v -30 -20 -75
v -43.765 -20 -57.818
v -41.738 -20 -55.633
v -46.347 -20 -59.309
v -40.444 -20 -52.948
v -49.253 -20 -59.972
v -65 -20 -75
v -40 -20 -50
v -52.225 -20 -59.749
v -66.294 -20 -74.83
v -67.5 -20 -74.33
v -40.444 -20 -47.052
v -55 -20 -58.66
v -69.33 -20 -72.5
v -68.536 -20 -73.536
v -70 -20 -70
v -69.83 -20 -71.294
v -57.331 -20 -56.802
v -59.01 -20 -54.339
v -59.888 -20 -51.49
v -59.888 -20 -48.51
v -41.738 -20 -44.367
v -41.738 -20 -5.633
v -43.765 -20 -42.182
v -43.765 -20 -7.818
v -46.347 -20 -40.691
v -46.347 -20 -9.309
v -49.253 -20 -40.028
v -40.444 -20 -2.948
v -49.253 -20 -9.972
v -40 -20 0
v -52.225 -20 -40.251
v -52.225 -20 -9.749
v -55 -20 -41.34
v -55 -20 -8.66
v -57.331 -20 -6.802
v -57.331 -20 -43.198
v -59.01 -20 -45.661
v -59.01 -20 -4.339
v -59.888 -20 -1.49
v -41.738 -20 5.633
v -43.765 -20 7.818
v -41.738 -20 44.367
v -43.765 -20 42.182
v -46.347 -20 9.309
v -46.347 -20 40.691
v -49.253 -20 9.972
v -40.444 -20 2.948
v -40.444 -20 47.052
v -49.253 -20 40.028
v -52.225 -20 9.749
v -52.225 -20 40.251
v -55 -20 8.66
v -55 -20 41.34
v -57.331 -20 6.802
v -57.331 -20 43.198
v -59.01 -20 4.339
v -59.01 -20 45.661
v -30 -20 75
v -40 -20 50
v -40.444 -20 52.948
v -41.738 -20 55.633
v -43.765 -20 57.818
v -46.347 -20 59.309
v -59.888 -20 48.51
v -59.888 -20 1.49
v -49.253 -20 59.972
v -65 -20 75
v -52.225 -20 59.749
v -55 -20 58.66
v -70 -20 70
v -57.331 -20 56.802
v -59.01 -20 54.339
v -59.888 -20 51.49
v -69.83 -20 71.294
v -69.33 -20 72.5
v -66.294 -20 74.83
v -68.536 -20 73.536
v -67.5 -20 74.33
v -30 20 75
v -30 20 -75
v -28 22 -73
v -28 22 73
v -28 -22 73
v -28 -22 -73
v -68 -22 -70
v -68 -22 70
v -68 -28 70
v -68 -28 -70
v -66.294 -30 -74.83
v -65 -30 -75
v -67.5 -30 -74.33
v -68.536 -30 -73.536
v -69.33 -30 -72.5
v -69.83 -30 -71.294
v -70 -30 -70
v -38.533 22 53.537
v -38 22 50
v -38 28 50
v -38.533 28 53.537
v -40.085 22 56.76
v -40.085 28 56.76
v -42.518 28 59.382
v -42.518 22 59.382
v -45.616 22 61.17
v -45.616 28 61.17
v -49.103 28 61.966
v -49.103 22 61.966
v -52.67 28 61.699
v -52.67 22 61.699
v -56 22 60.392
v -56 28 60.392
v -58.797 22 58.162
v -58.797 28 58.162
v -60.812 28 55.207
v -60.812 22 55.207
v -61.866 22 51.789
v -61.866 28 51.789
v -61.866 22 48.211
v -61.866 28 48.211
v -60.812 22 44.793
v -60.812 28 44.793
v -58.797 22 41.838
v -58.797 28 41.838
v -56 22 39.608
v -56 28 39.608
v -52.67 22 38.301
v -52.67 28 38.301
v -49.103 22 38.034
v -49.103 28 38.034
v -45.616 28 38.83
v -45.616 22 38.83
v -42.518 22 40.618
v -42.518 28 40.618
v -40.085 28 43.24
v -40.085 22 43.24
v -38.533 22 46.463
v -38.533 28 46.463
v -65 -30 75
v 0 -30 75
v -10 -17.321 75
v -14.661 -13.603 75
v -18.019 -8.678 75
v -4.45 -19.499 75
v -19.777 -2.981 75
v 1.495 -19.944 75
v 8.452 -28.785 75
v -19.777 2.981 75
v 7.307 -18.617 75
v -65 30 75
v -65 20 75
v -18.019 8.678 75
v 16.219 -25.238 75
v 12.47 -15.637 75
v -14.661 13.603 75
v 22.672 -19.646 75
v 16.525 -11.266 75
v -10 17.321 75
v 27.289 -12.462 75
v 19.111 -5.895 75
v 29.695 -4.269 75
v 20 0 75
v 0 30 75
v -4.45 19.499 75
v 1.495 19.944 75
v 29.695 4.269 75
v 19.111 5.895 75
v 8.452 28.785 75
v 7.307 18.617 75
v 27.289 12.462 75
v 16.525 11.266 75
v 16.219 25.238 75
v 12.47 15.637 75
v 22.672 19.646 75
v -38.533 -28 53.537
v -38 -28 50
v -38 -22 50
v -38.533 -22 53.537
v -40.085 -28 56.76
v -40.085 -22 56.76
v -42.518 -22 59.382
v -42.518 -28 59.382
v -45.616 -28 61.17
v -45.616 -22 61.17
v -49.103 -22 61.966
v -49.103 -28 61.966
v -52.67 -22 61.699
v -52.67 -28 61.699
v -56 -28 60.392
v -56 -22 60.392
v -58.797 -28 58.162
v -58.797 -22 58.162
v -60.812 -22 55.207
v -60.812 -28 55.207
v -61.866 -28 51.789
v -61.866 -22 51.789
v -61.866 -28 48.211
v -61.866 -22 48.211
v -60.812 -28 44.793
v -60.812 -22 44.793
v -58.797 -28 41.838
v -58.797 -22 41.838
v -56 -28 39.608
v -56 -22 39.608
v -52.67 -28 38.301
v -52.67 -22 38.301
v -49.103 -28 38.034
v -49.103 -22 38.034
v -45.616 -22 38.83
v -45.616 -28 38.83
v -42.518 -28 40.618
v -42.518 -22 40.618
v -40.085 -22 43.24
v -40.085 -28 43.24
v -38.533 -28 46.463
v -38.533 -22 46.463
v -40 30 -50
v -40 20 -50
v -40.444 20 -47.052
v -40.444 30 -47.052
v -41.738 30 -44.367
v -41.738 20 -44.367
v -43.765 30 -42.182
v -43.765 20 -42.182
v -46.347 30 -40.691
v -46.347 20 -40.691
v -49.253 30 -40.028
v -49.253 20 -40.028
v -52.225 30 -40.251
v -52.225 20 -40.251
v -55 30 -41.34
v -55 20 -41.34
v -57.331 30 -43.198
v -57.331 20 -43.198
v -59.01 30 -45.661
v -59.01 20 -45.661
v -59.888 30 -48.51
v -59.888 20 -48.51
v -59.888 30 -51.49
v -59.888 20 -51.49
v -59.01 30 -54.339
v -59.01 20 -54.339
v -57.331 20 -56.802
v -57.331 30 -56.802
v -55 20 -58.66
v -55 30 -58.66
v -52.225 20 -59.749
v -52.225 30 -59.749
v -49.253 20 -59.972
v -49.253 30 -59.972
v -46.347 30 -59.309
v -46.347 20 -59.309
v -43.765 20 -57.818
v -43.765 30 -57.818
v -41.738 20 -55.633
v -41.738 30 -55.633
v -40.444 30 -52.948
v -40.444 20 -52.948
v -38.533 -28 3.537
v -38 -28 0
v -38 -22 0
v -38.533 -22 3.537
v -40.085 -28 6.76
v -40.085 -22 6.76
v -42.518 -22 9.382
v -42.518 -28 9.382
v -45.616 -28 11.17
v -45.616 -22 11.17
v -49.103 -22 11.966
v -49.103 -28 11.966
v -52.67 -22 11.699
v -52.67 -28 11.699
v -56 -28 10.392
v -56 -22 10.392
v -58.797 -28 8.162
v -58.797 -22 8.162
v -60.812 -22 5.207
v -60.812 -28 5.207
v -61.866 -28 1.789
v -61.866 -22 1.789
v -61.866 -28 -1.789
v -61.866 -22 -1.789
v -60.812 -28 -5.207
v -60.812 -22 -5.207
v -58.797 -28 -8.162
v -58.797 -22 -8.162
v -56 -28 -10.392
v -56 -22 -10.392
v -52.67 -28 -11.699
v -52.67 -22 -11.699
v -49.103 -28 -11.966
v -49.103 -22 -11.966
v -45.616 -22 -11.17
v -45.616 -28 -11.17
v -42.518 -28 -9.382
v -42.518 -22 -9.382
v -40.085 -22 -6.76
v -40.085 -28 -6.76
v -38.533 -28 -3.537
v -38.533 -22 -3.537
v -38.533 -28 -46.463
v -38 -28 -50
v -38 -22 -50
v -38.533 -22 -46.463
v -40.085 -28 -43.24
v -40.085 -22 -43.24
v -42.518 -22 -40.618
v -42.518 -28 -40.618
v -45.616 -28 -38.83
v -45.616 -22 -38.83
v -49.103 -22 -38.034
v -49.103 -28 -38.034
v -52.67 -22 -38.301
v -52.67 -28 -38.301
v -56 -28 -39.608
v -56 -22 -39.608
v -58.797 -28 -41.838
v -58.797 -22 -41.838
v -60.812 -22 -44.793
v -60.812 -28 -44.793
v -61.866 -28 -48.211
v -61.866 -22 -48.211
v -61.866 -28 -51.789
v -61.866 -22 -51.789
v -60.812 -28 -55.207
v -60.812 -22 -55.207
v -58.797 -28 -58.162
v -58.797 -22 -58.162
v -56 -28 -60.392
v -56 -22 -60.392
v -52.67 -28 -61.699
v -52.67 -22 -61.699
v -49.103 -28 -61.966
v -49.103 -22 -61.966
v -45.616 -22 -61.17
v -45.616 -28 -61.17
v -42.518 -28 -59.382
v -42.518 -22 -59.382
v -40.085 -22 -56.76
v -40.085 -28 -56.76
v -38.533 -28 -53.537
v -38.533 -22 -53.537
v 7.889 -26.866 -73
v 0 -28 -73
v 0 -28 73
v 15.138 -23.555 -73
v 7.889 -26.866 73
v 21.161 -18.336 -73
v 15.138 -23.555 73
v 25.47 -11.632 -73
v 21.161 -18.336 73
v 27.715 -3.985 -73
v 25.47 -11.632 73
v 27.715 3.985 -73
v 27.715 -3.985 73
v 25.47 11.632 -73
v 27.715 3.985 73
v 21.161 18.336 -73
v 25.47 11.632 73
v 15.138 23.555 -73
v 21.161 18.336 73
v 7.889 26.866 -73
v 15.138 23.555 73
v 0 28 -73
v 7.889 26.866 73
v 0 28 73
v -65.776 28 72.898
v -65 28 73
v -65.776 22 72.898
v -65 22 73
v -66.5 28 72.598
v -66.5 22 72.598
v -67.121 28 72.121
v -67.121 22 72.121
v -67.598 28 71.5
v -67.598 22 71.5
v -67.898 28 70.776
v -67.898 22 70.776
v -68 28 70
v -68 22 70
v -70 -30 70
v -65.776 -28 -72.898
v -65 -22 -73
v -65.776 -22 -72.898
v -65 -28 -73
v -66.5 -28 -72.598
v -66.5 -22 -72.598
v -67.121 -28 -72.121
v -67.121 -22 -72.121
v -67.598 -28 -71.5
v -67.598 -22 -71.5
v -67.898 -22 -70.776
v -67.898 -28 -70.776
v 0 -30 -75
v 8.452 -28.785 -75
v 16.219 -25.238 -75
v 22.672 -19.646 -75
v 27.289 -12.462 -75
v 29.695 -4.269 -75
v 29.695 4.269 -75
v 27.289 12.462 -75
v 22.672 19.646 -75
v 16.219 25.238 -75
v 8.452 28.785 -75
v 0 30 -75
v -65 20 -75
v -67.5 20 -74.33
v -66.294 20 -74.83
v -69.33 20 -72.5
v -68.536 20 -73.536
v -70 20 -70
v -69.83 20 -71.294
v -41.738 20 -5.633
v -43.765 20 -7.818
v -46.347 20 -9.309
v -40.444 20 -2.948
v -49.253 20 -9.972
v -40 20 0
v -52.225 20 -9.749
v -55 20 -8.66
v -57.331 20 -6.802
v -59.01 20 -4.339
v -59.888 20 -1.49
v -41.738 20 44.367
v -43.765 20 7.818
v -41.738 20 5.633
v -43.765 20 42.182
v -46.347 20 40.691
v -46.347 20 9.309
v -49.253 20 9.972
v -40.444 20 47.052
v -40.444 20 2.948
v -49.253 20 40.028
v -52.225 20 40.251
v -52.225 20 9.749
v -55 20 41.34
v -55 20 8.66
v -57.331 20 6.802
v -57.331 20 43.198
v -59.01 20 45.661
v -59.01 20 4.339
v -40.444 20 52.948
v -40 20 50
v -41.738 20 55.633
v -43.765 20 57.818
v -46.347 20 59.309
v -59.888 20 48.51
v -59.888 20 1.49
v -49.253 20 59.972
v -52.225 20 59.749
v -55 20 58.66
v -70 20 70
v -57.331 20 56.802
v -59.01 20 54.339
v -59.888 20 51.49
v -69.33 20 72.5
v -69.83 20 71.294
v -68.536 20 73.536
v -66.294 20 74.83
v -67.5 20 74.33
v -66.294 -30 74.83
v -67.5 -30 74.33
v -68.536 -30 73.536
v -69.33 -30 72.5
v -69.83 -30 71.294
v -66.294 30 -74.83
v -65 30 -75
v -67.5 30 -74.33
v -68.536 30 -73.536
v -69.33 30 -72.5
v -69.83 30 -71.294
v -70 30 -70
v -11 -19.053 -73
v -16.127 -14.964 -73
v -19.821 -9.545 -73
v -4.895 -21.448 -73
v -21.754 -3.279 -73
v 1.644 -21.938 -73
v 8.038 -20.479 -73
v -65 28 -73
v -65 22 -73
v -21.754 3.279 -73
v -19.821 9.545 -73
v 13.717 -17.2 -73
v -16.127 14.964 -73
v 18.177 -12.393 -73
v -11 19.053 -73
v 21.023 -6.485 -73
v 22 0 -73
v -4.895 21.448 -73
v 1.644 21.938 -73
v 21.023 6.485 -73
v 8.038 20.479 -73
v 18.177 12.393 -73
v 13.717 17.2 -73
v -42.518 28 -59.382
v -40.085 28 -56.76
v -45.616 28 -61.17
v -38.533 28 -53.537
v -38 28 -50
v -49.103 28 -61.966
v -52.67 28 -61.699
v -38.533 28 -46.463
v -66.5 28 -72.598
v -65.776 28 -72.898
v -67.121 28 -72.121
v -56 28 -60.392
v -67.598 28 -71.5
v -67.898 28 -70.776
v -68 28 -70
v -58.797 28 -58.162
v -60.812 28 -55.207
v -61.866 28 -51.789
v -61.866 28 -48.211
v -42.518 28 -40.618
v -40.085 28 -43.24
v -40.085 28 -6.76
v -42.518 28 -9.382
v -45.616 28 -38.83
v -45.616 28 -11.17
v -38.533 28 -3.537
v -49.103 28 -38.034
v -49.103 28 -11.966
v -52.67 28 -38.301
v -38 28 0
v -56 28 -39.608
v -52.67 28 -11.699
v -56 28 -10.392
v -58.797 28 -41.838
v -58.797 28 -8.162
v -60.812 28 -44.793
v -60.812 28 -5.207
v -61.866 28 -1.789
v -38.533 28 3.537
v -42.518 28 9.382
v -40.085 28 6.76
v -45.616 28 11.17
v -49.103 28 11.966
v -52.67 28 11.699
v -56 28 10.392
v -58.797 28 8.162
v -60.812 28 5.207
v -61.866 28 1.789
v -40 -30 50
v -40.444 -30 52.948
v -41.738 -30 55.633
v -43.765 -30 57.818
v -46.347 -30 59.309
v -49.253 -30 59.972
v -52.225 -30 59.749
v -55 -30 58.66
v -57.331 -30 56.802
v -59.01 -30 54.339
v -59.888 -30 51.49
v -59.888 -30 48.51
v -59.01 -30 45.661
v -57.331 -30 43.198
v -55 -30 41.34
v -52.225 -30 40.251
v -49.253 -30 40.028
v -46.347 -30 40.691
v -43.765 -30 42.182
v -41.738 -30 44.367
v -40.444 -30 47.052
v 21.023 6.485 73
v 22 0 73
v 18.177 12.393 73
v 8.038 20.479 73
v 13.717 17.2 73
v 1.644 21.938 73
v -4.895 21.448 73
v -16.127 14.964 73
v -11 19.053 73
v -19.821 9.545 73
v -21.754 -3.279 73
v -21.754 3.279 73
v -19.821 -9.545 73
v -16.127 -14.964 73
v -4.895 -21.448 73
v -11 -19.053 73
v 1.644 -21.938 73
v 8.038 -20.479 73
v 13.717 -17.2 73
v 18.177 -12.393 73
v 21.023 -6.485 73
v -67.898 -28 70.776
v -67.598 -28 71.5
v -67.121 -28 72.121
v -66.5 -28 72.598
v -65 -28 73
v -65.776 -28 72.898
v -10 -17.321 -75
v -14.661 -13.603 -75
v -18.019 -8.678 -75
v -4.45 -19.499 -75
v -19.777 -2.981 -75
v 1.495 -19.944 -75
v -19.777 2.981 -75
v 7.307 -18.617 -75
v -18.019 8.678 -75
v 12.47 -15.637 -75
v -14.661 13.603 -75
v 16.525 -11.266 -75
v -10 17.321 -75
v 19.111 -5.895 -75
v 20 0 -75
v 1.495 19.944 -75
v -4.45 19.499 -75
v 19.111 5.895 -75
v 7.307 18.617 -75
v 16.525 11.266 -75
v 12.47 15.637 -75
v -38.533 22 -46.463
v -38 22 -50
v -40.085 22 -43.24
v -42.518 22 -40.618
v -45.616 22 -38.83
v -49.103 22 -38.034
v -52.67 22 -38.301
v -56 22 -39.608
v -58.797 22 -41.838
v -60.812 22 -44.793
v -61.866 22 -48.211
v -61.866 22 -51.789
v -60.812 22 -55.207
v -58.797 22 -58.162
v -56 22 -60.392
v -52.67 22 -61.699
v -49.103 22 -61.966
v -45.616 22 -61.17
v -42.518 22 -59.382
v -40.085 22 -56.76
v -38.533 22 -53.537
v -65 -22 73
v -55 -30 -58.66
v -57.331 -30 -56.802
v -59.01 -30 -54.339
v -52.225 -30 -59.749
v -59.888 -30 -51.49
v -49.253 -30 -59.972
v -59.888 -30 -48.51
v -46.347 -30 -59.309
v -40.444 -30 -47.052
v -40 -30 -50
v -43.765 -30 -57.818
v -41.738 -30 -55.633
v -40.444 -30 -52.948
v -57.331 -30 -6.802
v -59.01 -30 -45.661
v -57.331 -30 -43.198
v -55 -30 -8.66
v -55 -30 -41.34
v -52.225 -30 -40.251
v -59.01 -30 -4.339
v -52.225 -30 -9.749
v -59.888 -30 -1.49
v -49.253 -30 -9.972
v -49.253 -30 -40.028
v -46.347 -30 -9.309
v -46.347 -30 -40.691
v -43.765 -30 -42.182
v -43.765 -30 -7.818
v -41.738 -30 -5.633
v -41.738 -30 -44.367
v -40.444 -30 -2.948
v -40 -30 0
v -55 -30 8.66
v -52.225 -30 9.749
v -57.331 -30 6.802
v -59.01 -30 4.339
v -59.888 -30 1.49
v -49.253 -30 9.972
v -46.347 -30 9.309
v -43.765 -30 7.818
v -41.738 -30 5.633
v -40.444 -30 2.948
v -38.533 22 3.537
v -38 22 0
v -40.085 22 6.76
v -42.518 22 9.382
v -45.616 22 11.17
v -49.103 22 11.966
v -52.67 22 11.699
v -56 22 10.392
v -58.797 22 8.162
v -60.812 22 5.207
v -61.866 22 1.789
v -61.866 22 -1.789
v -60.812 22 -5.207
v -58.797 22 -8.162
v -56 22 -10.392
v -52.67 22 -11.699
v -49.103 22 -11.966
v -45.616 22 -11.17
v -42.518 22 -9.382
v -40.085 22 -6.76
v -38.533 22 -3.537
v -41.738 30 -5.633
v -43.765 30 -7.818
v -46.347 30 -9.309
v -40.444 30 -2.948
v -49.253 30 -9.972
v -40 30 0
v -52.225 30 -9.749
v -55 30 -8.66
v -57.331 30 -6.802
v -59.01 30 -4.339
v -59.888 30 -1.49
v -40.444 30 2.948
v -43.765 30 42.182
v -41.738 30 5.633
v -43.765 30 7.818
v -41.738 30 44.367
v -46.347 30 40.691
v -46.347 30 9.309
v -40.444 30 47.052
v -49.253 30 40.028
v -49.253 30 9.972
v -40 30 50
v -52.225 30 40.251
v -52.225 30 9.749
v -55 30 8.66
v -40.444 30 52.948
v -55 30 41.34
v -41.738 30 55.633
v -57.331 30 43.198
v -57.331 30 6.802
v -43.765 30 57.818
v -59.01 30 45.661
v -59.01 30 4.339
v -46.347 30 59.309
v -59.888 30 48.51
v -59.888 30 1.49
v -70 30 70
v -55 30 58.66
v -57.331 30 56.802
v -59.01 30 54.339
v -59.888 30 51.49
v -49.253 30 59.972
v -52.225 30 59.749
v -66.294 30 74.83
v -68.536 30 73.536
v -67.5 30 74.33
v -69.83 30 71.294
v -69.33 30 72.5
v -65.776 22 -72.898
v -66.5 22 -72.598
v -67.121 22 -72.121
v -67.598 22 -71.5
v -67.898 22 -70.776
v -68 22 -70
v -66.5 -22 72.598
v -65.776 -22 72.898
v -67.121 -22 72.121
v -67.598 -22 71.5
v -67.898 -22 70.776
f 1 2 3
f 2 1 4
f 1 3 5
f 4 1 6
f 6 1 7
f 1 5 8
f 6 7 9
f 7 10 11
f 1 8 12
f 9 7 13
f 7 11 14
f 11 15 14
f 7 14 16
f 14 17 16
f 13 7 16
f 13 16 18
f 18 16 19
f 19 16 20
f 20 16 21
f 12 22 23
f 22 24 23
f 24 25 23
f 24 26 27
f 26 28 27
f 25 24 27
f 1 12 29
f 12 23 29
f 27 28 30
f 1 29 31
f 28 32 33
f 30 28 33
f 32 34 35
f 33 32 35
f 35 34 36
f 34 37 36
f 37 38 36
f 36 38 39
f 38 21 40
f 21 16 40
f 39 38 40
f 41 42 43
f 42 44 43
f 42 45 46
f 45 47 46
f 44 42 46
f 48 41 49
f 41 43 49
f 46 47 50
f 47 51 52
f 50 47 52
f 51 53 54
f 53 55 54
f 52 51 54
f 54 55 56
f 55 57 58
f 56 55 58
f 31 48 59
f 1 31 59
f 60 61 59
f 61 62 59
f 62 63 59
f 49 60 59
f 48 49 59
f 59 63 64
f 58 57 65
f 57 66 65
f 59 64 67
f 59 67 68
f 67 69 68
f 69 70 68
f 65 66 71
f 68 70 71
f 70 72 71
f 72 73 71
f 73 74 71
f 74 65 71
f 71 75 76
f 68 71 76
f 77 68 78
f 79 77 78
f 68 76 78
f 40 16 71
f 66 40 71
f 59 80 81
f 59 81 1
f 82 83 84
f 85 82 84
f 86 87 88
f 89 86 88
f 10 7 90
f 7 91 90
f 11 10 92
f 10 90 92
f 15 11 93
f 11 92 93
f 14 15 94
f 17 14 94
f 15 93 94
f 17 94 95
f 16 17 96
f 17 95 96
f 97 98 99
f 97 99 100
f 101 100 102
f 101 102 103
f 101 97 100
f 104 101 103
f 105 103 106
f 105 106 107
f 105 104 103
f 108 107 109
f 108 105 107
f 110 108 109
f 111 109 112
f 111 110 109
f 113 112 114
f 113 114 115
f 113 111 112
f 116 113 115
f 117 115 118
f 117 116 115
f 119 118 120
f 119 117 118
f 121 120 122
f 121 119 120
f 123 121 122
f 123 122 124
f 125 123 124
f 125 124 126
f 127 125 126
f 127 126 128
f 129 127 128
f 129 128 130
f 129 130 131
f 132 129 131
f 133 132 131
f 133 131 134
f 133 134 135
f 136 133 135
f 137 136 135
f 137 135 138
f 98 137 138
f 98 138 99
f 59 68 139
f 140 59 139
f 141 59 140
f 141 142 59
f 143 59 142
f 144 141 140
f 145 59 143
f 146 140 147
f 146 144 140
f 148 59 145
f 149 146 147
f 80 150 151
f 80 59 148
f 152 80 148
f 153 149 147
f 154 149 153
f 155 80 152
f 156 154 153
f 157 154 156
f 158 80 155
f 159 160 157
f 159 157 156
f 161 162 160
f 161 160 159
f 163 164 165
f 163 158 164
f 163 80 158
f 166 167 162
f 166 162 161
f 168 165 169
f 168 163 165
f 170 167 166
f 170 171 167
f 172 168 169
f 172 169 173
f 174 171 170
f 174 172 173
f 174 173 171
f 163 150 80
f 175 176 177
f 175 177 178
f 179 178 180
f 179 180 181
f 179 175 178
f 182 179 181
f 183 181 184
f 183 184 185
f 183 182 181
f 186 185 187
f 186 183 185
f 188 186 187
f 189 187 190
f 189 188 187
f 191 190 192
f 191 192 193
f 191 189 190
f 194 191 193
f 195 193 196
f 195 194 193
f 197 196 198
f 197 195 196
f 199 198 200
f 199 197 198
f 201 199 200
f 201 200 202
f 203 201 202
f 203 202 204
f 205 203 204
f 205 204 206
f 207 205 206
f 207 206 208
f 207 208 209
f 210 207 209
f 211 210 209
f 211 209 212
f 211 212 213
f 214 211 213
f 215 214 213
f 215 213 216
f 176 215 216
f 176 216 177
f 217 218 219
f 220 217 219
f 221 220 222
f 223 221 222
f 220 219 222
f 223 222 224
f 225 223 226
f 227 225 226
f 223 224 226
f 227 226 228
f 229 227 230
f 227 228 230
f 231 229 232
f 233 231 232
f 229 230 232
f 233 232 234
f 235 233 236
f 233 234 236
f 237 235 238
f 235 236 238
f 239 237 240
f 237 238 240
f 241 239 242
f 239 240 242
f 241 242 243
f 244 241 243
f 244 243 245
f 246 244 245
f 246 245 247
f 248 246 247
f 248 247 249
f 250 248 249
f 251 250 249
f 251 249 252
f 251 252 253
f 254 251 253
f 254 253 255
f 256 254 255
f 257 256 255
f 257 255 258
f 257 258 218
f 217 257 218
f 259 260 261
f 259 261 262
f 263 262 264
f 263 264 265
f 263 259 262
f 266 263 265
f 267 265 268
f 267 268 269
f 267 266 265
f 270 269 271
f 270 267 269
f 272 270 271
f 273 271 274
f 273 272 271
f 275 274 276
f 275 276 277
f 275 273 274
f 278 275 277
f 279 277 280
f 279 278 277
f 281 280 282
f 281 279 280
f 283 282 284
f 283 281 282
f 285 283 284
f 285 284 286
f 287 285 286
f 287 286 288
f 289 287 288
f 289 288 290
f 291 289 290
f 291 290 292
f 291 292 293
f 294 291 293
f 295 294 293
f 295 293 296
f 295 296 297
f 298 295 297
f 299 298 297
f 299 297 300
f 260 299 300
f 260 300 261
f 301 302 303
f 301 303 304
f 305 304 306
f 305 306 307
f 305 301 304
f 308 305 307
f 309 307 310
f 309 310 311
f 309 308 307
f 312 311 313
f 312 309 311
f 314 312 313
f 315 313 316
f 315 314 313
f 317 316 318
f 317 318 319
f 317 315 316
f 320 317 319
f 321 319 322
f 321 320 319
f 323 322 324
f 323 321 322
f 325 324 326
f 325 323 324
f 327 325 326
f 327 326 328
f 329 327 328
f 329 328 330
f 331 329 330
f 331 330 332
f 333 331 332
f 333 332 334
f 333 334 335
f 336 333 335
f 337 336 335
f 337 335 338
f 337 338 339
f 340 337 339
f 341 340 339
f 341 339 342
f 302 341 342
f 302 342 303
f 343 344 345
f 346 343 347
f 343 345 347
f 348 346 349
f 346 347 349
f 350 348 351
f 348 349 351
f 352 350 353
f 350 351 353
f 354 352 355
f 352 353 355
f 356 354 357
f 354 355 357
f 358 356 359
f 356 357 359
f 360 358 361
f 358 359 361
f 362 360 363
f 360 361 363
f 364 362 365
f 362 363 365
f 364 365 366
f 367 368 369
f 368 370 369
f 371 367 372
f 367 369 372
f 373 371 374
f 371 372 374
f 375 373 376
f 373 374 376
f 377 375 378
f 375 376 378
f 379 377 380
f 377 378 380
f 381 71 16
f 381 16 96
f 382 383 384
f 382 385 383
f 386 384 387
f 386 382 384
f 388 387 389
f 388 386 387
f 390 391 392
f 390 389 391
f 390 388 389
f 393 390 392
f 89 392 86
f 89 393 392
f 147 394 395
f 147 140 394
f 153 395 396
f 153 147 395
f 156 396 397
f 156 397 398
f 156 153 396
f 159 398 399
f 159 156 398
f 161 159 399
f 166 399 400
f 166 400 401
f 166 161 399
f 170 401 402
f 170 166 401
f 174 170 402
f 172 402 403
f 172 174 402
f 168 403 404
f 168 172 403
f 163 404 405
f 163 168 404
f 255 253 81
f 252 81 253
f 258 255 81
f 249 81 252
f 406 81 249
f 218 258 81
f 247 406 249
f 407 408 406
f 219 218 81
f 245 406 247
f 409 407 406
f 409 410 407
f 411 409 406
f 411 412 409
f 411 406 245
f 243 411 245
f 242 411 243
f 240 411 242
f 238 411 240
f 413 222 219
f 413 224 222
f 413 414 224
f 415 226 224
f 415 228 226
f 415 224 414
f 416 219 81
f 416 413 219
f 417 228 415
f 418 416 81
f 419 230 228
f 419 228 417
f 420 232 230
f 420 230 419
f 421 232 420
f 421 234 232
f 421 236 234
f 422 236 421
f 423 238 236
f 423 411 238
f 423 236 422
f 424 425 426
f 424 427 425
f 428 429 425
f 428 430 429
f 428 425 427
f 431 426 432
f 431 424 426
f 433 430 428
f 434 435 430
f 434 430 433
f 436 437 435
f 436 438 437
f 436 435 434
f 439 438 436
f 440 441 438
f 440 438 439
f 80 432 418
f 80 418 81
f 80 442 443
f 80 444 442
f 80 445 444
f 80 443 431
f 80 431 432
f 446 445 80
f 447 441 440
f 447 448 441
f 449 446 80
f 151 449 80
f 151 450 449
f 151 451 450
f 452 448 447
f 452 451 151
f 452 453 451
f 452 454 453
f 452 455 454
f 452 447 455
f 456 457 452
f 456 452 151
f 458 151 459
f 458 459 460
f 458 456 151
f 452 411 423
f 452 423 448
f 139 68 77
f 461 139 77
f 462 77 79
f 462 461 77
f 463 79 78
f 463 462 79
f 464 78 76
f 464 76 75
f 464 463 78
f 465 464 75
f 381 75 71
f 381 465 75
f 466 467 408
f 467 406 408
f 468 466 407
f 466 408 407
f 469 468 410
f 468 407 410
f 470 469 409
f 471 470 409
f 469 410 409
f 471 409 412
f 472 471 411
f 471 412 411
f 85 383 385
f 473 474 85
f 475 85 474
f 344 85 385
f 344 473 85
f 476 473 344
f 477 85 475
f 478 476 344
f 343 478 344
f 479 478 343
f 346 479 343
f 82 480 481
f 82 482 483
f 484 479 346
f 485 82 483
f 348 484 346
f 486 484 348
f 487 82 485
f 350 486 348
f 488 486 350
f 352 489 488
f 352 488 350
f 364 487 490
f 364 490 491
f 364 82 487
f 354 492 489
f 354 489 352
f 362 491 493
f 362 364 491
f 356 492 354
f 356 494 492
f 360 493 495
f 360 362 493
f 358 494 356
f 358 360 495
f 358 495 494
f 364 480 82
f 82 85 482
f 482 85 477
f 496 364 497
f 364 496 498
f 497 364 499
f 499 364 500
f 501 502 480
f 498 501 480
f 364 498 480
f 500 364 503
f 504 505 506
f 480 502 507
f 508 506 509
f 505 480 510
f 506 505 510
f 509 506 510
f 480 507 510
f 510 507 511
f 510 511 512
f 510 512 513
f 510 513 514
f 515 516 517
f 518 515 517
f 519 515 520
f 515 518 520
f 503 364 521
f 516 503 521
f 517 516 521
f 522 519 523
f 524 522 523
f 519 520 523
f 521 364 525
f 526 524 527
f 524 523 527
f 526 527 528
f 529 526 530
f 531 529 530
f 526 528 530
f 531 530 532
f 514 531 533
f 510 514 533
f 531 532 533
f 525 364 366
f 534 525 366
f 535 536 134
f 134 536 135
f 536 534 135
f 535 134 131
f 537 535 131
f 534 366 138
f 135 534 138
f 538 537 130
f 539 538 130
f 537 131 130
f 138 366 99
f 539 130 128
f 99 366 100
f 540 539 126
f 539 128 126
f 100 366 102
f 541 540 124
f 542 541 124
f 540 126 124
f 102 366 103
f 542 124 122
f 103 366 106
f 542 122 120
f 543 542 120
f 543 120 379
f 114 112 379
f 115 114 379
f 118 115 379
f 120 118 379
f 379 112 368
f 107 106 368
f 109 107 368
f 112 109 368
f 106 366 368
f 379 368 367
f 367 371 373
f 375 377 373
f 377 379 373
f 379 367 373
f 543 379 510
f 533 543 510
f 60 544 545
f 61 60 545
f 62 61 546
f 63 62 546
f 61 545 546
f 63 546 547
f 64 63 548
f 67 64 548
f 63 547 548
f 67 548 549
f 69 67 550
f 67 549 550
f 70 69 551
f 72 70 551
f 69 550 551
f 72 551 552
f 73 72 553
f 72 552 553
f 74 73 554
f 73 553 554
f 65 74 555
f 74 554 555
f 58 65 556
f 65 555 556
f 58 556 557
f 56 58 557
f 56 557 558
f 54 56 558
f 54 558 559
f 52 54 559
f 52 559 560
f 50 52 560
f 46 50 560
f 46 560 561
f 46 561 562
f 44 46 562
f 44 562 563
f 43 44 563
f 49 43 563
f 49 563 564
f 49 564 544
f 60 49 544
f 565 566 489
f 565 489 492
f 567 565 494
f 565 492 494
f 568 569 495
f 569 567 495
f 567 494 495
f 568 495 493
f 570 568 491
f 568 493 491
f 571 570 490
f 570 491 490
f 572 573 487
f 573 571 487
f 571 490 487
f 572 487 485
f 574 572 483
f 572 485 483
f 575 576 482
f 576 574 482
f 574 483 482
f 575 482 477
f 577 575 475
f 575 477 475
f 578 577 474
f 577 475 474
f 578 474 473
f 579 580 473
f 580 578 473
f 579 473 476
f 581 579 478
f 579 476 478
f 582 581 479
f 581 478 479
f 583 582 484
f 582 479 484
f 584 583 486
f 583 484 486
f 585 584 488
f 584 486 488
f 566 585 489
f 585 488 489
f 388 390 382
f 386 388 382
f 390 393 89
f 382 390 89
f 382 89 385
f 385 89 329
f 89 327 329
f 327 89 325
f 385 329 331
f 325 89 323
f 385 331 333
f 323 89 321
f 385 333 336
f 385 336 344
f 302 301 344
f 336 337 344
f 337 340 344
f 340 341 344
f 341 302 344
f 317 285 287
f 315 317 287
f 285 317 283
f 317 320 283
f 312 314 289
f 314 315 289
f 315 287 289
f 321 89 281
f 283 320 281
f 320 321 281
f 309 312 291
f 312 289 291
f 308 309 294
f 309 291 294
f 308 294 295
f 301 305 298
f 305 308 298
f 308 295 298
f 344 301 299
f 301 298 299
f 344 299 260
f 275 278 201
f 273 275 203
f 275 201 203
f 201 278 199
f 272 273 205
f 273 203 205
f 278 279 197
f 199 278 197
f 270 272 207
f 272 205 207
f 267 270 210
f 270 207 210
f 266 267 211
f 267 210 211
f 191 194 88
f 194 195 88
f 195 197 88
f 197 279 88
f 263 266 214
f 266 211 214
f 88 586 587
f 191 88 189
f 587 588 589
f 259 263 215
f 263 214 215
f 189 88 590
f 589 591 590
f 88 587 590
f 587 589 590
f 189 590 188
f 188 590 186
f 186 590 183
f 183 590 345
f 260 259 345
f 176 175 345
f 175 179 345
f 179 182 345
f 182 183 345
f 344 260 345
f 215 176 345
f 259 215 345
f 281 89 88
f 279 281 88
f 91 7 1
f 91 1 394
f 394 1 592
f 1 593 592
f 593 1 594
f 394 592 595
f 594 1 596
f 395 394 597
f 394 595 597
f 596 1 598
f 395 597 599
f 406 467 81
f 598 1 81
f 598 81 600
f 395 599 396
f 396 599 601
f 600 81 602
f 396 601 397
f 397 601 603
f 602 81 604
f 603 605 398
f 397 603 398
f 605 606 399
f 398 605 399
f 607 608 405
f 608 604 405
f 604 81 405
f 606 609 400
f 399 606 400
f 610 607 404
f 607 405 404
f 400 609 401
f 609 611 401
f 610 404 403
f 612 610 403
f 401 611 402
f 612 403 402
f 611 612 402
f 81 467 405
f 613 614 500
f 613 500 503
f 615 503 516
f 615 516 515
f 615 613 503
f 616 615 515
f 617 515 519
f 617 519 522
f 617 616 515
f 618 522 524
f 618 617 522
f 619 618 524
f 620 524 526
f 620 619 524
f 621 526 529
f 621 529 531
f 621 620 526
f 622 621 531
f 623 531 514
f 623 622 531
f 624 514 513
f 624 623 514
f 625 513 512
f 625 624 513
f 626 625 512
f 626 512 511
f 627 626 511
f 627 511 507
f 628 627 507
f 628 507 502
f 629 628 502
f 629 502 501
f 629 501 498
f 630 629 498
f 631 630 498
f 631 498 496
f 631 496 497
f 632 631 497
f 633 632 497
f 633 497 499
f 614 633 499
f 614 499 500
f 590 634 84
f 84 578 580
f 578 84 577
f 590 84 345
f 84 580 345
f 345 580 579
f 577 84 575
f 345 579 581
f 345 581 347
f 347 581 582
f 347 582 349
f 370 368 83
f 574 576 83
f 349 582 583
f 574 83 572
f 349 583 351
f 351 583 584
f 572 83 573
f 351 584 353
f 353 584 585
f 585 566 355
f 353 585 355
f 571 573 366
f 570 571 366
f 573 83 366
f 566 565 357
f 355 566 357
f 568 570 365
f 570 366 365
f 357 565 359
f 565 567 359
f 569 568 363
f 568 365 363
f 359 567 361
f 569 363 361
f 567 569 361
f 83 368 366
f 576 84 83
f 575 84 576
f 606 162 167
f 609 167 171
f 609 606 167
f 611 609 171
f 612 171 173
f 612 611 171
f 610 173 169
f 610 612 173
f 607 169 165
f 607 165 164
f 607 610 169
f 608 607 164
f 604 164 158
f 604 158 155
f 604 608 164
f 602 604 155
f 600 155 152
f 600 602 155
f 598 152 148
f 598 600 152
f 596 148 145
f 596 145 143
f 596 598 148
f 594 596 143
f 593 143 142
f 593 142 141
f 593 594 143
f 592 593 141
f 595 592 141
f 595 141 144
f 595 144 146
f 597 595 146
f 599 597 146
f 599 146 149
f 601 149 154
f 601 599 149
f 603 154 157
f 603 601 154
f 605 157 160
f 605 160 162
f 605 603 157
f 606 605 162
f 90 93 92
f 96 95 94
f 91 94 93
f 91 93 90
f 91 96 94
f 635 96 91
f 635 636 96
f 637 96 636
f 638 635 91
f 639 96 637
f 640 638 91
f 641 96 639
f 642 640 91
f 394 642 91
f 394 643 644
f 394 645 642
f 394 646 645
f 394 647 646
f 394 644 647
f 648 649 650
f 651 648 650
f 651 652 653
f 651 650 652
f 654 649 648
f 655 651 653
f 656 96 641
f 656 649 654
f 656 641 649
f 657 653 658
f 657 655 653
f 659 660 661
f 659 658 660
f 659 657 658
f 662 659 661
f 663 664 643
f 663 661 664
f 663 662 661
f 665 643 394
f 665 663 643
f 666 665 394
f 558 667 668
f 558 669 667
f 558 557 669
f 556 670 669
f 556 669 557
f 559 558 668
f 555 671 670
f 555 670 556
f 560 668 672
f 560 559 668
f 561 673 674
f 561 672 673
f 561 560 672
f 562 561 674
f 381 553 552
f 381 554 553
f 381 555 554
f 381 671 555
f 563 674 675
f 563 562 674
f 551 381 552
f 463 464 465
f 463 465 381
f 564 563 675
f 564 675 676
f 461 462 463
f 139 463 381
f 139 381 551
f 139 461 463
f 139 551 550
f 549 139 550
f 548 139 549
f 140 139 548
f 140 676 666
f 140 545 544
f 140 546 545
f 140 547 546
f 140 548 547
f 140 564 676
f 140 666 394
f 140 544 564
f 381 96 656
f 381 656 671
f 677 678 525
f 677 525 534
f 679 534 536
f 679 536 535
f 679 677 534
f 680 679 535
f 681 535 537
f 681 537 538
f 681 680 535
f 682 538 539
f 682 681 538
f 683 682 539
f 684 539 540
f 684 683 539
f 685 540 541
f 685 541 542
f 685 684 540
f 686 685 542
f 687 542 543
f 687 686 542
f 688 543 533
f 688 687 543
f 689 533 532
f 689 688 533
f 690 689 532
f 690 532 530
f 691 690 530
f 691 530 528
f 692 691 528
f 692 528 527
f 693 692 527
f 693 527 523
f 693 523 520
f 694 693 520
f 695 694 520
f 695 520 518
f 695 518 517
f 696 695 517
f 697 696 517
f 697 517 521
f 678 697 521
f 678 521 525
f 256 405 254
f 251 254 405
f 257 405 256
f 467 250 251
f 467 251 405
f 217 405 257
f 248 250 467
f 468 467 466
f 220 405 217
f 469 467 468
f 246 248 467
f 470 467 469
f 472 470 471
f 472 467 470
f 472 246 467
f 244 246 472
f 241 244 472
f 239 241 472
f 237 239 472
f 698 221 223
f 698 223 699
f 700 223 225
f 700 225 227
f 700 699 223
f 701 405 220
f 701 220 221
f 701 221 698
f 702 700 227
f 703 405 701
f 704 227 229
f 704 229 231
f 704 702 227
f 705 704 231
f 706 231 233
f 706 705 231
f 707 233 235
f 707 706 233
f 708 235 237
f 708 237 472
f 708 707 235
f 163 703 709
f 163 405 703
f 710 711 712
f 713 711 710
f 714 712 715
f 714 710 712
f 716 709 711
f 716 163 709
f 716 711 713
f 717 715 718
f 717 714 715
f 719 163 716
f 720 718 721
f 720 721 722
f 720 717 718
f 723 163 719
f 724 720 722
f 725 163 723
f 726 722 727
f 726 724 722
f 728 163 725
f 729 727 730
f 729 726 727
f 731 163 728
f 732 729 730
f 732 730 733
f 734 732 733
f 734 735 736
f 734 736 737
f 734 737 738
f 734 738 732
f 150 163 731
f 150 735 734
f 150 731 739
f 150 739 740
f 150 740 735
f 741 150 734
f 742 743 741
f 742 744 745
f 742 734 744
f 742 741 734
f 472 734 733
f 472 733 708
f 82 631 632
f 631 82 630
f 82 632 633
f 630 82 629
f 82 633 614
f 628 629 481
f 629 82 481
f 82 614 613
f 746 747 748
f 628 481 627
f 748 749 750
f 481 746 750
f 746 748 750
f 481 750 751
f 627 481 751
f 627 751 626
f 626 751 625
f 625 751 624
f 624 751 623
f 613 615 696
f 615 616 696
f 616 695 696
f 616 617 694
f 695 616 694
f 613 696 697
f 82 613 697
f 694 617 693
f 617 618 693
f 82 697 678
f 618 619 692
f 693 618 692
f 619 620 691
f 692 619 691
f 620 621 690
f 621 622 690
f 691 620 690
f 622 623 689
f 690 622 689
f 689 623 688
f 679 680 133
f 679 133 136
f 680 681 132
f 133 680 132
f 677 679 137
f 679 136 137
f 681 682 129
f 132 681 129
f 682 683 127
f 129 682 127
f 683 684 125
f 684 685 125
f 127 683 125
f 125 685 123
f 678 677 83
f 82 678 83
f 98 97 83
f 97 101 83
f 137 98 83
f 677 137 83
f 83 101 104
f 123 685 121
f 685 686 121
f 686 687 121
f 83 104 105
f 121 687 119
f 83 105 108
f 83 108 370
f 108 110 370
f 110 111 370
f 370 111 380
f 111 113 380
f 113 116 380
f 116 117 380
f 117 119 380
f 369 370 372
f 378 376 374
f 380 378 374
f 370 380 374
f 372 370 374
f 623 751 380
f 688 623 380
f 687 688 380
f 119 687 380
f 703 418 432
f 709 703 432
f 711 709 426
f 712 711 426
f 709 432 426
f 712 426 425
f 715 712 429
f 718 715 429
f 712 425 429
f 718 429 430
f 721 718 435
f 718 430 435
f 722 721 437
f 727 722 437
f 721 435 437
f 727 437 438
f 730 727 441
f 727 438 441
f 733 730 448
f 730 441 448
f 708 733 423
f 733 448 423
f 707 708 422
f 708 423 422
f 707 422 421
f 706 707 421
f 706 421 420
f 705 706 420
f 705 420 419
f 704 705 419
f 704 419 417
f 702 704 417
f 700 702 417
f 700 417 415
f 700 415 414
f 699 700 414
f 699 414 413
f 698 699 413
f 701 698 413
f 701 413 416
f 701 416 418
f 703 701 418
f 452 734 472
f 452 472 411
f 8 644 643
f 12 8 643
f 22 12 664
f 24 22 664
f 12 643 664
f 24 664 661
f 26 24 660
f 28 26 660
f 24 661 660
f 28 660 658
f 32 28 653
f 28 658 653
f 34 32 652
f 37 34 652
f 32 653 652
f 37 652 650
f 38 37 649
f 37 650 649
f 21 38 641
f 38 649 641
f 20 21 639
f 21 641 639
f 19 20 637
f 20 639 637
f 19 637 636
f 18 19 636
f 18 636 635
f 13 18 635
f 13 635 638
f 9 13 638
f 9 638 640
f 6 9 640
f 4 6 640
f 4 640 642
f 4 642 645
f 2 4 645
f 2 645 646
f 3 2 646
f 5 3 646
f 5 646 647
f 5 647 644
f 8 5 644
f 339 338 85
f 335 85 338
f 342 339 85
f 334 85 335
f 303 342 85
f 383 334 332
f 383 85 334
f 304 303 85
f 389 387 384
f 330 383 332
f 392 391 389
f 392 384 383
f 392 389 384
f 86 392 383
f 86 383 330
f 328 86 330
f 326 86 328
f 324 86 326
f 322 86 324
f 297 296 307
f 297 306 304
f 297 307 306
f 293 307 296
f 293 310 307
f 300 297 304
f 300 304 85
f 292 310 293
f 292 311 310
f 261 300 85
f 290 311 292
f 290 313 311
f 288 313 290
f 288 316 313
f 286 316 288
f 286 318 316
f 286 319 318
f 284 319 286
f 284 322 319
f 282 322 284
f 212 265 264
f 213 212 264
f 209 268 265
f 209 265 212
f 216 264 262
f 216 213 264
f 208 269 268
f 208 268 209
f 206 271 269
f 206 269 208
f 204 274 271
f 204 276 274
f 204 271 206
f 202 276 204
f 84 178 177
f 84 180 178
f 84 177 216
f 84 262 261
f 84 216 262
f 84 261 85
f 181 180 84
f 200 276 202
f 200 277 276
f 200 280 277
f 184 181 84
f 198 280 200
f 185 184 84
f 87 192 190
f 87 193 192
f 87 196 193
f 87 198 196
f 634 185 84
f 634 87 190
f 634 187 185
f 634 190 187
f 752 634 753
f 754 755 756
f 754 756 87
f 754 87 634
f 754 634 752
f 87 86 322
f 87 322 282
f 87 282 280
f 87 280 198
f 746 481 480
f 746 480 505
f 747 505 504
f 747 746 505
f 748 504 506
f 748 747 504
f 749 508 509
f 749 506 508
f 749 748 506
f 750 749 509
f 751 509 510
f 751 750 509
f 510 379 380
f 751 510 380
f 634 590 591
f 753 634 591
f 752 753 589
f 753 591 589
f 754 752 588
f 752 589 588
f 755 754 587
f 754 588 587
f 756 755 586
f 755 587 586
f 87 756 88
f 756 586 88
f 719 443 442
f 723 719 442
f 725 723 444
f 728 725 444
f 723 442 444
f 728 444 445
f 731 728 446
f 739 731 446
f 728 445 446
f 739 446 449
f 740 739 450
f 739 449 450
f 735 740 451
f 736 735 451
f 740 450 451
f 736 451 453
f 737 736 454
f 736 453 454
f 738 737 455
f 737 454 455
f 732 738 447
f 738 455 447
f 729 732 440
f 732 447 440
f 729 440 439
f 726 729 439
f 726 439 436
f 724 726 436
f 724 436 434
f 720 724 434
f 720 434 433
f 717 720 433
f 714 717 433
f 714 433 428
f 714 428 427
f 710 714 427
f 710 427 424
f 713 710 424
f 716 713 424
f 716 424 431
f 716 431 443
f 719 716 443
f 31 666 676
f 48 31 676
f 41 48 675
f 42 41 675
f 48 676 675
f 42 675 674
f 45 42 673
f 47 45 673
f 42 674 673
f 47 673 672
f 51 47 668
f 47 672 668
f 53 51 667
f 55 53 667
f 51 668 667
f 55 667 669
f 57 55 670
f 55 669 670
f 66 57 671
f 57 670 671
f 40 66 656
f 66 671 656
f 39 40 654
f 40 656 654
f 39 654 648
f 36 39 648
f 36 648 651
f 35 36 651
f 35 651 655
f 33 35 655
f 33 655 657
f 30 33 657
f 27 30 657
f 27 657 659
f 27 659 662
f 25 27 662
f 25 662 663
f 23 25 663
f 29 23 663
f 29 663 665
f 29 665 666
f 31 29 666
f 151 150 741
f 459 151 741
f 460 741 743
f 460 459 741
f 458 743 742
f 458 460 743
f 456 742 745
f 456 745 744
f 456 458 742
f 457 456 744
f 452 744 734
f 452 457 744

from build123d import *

# Parameters (mm, degrees)
F0_R     = 20
F1_DEPTH = 75
F2_W     = 40
F2_H     = 150
F3_DEPTH = 40
F4_R     = 10
F5_DEPTH = 60
F6_R     = 5
F7_T     = -2


with BuildPart() as f1:
    # F0 (on Top) → F1 (new body, symmetric)
    with BuildSketch(Plane.XY):
        with BuildLine():
            ThreePointArc((30, 0), (21.2132034356, 21.2132034356), (0, 30))
            ThreePointArc((0, 30), (-30, 0), (0, -30))
            ThreePointArc((0, -30), (21.2132034356, -21.2132034356), (30, 0))
        make_face()
        Circle(F0_R, mode=Mode.SUBTRACT)
        with BuildLine():
            Line((0, 30), (-70, 30))
            Line((-70, 30), (-70, -30))
            Line((-70, -30), (0, -30))
            ThreePointArc((0, -30), (-30, 0), (0, 30))
        make_face()
    extrude(amount=F1_DEPTH, both=True)

    # F2 (on face) → F3 (cut)
    with BuildSketch(Plane(origin=(-70, 0, 0), x_dir=(0, -1, 0), z_dir=(-1, 0, 0))):
        Rectangle(F2_W, F2_H)
    extrude(amount=-F3_DEPTH, mode=Mode.SUBTRACT)

    # F4 (on face) → F5 (cut)
    with BuildSketch(Plane.XZ.offset(30)):
        with Locations((-50, 50)):
            Circle(F4_R)
        with Locations((-50, 0)):
            Circle(F4_R)
        with Locations((-50, -50)):
            Circle(F4_R)
    extrude(amount=-F5_DEPTH, mode=Mode.SUBTRACT)

    # F6
    f6_edges = [f1.edges().sort_by_distance(p)[0] for p in [
        (-70, 25, 75),
        (-70, -25, 75),
        (-70, 25, -75),
        (-70, -25, -75),
    ]]
    fillet(f6_edges, radius=F6_R)

    # F7 (hollow: no face is removed)
    offset(amount=F7_T, kind=Kind.INTERSECTION, mode=Mode.SUBTRACT)


solid = f1.part
